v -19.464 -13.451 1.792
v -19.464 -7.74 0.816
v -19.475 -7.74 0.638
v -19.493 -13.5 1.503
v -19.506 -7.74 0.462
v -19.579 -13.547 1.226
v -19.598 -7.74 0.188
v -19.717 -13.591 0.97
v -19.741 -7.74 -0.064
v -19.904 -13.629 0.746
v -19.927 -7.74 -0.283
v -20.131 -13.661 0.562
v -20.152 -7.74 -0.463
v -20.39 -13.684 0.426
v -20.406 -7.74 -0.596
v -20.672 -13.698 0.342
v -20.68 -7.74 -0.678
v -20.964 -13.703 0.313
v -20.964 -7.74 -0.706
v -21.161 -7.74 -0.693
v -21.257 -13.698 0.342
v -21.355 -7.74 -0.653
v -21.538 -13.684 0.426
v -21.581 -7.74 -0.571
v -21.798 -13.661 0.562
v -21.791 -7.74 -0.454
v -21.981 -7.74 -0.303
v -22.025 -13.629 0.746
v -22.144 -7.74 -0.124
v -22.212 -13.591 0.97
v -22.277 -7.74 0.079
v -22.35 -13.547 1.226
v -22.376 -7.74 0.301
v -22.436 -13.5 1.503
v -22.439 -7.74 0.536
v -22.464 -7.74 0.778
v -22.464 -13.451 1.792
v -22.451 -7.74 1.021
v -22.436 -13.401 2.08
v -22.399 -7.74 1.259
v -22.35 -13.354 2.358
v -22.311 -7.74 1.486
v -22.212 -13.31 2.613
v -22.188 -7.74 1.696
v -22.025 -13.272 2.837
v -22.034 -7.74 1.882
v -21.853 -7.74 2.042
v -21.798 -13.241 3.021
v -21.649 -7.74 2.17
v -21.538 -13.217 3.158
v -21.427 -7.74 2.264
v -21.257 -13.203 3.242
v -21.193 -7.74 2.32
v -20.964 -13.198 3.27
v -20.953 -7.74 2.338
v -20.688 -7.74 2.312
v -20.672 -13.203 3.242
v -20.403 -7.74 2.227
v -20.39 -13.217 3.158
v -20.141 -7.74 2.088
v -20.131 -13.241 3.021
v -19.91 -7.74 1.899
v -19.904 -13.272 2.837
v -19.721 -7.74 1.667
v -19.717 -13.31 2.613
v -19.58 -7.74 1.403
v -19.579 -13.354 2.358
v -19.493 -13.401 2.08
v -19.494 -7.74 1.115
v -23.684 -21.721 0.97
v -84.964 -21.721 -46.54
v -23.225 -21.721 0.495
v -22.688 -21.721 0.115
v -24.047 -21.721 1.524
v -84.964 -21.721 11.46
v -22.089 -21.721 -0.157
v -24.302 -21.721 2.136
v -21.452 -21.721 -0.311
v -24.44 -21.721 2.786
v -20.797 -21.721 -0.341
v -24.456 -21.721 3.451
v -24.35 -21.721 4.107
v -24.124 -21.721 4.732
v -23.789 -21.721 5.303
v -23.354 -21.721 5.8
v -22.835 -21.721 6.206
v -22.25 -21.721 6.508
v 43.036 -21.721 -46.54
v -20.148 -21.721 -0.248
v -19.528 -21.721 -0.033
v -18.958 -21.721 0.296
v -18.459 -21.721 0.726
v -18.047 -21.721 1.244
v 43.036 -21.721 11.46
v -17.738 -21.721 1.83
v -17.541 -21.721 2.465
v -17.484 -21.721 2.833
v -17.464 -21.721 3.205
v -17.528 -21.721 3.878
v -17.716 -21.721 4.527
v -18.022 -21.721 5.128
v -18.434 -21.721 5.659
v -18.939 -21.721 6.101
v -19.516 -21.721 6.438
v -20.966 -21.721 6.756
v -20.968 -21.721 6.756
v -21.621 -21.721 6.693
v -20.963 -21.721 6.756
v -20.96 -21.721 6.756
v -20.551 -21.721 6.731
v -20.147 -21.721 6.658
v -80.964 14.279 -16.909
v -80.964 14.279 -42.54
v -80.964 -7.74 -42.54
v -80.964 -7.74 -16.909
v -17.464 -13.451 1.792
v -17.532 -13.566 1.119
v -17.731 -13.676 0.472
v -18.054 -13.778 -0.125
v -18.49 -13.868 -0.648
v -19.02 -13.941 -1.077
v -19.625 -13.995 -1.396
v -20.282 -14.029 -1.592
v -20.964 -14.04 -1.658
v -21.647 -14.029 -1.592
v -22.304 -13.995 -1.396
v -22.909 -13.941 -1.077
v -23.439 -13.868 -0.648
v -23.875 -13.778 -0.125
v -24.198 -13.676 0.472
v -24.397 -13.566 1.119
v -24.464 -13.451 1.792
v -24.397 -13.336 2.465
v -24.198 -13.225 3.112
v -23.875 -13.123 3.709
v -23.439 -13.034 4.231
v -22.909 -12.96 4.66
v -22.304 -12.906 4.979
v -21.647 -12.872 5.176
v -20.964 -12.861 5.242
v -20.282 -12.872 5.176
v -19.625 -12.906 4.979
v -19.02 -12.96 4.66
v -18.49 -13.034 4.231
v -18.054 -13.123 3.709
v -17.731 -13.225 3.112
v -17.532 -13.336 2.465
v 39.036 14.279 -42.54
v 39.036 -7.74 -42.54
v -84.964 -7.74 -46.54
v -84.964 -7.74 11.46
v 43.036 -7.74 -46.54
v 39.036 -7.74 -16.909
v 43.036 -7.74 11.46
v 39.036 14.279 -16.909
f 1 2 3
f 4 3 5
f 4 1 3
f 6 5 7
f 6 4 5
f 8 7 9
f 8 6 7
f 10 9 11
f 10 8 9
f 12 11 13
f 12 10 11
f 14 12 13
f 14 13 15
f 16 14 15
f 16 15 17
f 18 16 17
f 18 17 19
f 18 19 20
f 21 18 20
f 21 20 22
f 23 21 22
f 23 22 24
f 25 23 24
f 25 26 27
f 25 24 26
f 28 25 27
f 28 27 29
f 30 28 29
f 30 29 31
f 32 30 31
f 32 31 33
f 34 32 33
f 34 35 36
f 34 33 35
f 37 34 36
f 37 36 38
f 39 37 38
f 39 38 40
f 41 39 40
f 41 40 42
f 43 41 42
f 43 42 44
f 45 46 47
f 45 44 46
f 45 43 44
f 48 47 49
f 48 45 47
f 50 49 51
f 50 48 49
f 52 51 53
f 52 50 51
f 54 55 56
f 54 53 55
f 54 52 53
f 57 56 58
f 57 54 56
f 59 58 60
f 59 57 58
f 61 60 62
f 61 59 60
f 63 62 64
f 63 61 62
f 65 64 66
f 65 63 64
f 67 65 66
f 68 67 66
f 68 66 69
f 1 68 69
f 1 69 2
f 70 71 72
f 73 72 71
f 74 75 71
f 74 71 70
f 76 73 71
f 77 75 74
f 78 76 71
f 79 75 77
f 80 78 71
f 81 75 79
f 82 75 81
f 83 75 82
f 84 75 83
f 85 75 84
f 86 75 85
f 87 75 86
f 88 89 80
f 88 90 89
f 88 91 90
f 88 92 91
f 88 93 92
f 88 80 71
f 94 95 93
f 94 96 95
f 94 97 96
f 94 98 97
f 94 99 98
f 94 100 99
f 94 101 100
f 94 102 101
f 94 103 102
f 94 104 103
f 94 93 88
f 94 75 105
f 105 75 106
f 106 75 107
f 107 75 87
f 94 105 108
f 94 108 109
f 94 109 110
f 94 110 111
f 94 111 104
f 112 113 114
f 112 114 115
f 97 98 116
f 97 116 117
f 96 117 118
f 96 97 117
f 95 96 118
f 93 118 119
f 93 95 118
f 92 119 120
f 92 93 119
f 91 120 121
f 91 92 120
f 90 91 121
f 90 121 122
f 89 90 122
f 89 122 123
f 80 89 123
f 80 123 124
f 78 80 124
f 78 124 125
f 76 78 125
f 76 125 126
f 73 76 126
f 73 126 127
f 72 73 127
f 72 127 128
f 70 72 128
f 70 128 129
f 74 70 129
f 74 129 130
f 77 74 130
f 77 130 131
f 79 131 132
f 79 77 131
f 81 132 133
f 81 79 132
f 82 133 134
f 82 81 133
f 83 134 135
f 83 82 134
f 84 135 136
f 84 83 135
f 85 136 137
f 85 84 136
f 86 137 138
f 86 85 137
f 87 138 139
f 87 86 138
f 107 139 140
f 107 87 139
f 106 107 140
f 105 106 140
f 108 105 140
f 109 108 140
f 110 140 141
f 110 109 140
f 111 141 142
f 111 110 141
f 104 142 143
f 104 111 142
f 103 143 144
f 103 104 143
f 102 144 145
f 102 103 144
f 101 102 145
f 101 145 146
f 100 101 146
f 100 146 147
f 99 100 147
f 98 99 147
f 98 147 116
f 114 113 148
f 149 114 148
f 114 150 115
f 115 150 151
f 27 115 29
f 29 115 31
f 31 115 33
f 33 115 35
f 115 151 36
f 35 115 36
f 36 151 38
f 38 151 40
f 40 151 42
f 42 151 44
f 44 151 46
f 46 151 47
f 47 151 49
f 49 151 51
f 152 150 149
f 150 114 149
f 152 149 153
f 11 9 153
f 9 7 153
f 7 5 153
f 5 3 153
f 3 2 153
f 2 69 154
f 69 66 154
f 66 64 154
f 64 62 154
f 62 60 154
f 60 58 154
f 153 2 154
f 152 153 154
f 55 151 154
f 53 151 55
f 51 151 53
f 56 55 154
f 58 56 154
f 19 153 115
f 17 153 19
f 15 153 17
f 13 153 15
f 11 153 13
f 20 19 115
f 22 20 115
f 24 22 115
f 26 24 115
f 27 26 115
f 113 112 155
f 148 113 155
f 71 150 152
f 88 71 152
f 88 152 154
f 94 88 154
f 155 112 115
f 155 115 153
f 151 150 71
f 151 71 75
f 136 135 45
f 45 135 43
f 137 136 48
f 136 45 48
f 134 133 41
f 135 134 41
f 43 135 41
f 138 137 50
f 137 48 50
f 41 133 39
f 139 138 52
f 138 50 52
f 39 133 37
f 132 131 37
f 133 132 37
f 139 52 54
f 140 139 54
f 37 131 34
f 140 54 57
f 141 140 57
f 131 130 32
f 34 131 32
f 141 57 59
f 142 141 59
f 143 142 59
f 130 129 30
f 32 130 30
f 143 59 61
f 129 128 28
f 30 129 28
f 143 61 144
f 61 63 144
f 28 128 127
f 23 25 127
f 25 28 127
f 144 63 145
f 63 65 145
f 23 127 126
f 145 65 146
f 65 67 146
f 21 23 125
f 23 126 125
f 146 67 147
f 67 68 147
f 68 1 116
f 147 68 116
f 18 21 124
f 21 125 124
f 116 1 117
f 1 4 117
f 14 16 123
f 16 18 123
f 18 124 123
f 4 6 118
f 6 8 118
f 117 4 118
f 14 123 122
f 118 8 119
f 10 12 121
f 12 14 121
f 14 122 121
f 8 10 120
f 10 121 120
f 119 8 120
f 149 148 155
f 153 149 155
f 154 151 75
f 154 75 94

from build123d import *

# Parameters (mm, degrees)
SKETCH1_W           = 120
SKETCH1_H           = 25.630963903
BOSS_EXTRUDE1_DEPTH = 22.019128
SKETCH2_W           = 128
SKETCH2_H           = 58
BOSS_EXTRUDE2_DEPTH = 13.980872
CAVITY1_START       = -22.548845462
CAVITY1_OUTLINE_R   = 3.5
CAVITY1_DEPTH       = 8.988590673
CAVITY1_START_2     = -13.560254789
CAVITY1_2_OUTLINE_R = 1.5
CAVITY1_2_DEPTH     = 6.049448343


# Read off the part's stored shape, not the designer's step: Cavity1
with BuildPart() as part:
    # Sketch1 → Boss-Extrude1 (new body)
    with BuildSketch(Plane.XZ.offset(-14.278818257)):
        with Locations((-20.964398438, -29.724047508)):
            Rectangle(SKETCH1_W, SKETCH1_H)
    extrude(amount=BOSS_EXTRUDE1_DEPTH)


with BuildPart() as boss_extrude2_tool:
    # Sketch2 → Boss-Extrude2 (new body)
    with BuildSketch(Plane.XZ.offset(7.740310225)):
        with Locations((-20.964398438, -17.53952946)):
            Rectangle(SKETCH2_W, SKETCH2_H)
    extrude(amount=BOSS_EXTRUDE2_DEPTH)


with BuildPart() as part_1:
    add(part.part)


with BuildPart() as part_2:
    # Boss-Extrude2: joined with boss_extrude2_tool
    add(part_1.part.fuse(boss_extrude2_tool.part, tol=0.00001))

    # Cavity1 outline → Cavity1 (cut)
    with BuildSketch(Plane(origin=(0, 0, 0), x_dir=(1, 0, 0), z_dir=(0, 0.9857095962326692, -0.16845353037211303)).offset(CAVITY1_START)):
        with Locations((-20.964398438, 0.499578973)):
            Circle(CAVITY1_OUTLINE_R)
    extrude(amount=CAVITY1_DEPTH, mode=Mode.SUBTRACT)

    # Cavity1 2 outline → Cavity1 2 (cut)
    with BuildSketch(Plane(origin=(0, 0, 0), x_dir=(1, 0, 0), z_dir=(0, 0.9857095962326692, -0.16845353037211303)).offset(CAVITY1_START_2)):
        with Locations((-20.964398438, 0.499578973)):
            Circle(CAVITY1_2_OUTLINE_R)
    extrude(amount=CAVITY1_2_DEPTH, mode=Mode.SUBTRACT)


solid = part_2.part
